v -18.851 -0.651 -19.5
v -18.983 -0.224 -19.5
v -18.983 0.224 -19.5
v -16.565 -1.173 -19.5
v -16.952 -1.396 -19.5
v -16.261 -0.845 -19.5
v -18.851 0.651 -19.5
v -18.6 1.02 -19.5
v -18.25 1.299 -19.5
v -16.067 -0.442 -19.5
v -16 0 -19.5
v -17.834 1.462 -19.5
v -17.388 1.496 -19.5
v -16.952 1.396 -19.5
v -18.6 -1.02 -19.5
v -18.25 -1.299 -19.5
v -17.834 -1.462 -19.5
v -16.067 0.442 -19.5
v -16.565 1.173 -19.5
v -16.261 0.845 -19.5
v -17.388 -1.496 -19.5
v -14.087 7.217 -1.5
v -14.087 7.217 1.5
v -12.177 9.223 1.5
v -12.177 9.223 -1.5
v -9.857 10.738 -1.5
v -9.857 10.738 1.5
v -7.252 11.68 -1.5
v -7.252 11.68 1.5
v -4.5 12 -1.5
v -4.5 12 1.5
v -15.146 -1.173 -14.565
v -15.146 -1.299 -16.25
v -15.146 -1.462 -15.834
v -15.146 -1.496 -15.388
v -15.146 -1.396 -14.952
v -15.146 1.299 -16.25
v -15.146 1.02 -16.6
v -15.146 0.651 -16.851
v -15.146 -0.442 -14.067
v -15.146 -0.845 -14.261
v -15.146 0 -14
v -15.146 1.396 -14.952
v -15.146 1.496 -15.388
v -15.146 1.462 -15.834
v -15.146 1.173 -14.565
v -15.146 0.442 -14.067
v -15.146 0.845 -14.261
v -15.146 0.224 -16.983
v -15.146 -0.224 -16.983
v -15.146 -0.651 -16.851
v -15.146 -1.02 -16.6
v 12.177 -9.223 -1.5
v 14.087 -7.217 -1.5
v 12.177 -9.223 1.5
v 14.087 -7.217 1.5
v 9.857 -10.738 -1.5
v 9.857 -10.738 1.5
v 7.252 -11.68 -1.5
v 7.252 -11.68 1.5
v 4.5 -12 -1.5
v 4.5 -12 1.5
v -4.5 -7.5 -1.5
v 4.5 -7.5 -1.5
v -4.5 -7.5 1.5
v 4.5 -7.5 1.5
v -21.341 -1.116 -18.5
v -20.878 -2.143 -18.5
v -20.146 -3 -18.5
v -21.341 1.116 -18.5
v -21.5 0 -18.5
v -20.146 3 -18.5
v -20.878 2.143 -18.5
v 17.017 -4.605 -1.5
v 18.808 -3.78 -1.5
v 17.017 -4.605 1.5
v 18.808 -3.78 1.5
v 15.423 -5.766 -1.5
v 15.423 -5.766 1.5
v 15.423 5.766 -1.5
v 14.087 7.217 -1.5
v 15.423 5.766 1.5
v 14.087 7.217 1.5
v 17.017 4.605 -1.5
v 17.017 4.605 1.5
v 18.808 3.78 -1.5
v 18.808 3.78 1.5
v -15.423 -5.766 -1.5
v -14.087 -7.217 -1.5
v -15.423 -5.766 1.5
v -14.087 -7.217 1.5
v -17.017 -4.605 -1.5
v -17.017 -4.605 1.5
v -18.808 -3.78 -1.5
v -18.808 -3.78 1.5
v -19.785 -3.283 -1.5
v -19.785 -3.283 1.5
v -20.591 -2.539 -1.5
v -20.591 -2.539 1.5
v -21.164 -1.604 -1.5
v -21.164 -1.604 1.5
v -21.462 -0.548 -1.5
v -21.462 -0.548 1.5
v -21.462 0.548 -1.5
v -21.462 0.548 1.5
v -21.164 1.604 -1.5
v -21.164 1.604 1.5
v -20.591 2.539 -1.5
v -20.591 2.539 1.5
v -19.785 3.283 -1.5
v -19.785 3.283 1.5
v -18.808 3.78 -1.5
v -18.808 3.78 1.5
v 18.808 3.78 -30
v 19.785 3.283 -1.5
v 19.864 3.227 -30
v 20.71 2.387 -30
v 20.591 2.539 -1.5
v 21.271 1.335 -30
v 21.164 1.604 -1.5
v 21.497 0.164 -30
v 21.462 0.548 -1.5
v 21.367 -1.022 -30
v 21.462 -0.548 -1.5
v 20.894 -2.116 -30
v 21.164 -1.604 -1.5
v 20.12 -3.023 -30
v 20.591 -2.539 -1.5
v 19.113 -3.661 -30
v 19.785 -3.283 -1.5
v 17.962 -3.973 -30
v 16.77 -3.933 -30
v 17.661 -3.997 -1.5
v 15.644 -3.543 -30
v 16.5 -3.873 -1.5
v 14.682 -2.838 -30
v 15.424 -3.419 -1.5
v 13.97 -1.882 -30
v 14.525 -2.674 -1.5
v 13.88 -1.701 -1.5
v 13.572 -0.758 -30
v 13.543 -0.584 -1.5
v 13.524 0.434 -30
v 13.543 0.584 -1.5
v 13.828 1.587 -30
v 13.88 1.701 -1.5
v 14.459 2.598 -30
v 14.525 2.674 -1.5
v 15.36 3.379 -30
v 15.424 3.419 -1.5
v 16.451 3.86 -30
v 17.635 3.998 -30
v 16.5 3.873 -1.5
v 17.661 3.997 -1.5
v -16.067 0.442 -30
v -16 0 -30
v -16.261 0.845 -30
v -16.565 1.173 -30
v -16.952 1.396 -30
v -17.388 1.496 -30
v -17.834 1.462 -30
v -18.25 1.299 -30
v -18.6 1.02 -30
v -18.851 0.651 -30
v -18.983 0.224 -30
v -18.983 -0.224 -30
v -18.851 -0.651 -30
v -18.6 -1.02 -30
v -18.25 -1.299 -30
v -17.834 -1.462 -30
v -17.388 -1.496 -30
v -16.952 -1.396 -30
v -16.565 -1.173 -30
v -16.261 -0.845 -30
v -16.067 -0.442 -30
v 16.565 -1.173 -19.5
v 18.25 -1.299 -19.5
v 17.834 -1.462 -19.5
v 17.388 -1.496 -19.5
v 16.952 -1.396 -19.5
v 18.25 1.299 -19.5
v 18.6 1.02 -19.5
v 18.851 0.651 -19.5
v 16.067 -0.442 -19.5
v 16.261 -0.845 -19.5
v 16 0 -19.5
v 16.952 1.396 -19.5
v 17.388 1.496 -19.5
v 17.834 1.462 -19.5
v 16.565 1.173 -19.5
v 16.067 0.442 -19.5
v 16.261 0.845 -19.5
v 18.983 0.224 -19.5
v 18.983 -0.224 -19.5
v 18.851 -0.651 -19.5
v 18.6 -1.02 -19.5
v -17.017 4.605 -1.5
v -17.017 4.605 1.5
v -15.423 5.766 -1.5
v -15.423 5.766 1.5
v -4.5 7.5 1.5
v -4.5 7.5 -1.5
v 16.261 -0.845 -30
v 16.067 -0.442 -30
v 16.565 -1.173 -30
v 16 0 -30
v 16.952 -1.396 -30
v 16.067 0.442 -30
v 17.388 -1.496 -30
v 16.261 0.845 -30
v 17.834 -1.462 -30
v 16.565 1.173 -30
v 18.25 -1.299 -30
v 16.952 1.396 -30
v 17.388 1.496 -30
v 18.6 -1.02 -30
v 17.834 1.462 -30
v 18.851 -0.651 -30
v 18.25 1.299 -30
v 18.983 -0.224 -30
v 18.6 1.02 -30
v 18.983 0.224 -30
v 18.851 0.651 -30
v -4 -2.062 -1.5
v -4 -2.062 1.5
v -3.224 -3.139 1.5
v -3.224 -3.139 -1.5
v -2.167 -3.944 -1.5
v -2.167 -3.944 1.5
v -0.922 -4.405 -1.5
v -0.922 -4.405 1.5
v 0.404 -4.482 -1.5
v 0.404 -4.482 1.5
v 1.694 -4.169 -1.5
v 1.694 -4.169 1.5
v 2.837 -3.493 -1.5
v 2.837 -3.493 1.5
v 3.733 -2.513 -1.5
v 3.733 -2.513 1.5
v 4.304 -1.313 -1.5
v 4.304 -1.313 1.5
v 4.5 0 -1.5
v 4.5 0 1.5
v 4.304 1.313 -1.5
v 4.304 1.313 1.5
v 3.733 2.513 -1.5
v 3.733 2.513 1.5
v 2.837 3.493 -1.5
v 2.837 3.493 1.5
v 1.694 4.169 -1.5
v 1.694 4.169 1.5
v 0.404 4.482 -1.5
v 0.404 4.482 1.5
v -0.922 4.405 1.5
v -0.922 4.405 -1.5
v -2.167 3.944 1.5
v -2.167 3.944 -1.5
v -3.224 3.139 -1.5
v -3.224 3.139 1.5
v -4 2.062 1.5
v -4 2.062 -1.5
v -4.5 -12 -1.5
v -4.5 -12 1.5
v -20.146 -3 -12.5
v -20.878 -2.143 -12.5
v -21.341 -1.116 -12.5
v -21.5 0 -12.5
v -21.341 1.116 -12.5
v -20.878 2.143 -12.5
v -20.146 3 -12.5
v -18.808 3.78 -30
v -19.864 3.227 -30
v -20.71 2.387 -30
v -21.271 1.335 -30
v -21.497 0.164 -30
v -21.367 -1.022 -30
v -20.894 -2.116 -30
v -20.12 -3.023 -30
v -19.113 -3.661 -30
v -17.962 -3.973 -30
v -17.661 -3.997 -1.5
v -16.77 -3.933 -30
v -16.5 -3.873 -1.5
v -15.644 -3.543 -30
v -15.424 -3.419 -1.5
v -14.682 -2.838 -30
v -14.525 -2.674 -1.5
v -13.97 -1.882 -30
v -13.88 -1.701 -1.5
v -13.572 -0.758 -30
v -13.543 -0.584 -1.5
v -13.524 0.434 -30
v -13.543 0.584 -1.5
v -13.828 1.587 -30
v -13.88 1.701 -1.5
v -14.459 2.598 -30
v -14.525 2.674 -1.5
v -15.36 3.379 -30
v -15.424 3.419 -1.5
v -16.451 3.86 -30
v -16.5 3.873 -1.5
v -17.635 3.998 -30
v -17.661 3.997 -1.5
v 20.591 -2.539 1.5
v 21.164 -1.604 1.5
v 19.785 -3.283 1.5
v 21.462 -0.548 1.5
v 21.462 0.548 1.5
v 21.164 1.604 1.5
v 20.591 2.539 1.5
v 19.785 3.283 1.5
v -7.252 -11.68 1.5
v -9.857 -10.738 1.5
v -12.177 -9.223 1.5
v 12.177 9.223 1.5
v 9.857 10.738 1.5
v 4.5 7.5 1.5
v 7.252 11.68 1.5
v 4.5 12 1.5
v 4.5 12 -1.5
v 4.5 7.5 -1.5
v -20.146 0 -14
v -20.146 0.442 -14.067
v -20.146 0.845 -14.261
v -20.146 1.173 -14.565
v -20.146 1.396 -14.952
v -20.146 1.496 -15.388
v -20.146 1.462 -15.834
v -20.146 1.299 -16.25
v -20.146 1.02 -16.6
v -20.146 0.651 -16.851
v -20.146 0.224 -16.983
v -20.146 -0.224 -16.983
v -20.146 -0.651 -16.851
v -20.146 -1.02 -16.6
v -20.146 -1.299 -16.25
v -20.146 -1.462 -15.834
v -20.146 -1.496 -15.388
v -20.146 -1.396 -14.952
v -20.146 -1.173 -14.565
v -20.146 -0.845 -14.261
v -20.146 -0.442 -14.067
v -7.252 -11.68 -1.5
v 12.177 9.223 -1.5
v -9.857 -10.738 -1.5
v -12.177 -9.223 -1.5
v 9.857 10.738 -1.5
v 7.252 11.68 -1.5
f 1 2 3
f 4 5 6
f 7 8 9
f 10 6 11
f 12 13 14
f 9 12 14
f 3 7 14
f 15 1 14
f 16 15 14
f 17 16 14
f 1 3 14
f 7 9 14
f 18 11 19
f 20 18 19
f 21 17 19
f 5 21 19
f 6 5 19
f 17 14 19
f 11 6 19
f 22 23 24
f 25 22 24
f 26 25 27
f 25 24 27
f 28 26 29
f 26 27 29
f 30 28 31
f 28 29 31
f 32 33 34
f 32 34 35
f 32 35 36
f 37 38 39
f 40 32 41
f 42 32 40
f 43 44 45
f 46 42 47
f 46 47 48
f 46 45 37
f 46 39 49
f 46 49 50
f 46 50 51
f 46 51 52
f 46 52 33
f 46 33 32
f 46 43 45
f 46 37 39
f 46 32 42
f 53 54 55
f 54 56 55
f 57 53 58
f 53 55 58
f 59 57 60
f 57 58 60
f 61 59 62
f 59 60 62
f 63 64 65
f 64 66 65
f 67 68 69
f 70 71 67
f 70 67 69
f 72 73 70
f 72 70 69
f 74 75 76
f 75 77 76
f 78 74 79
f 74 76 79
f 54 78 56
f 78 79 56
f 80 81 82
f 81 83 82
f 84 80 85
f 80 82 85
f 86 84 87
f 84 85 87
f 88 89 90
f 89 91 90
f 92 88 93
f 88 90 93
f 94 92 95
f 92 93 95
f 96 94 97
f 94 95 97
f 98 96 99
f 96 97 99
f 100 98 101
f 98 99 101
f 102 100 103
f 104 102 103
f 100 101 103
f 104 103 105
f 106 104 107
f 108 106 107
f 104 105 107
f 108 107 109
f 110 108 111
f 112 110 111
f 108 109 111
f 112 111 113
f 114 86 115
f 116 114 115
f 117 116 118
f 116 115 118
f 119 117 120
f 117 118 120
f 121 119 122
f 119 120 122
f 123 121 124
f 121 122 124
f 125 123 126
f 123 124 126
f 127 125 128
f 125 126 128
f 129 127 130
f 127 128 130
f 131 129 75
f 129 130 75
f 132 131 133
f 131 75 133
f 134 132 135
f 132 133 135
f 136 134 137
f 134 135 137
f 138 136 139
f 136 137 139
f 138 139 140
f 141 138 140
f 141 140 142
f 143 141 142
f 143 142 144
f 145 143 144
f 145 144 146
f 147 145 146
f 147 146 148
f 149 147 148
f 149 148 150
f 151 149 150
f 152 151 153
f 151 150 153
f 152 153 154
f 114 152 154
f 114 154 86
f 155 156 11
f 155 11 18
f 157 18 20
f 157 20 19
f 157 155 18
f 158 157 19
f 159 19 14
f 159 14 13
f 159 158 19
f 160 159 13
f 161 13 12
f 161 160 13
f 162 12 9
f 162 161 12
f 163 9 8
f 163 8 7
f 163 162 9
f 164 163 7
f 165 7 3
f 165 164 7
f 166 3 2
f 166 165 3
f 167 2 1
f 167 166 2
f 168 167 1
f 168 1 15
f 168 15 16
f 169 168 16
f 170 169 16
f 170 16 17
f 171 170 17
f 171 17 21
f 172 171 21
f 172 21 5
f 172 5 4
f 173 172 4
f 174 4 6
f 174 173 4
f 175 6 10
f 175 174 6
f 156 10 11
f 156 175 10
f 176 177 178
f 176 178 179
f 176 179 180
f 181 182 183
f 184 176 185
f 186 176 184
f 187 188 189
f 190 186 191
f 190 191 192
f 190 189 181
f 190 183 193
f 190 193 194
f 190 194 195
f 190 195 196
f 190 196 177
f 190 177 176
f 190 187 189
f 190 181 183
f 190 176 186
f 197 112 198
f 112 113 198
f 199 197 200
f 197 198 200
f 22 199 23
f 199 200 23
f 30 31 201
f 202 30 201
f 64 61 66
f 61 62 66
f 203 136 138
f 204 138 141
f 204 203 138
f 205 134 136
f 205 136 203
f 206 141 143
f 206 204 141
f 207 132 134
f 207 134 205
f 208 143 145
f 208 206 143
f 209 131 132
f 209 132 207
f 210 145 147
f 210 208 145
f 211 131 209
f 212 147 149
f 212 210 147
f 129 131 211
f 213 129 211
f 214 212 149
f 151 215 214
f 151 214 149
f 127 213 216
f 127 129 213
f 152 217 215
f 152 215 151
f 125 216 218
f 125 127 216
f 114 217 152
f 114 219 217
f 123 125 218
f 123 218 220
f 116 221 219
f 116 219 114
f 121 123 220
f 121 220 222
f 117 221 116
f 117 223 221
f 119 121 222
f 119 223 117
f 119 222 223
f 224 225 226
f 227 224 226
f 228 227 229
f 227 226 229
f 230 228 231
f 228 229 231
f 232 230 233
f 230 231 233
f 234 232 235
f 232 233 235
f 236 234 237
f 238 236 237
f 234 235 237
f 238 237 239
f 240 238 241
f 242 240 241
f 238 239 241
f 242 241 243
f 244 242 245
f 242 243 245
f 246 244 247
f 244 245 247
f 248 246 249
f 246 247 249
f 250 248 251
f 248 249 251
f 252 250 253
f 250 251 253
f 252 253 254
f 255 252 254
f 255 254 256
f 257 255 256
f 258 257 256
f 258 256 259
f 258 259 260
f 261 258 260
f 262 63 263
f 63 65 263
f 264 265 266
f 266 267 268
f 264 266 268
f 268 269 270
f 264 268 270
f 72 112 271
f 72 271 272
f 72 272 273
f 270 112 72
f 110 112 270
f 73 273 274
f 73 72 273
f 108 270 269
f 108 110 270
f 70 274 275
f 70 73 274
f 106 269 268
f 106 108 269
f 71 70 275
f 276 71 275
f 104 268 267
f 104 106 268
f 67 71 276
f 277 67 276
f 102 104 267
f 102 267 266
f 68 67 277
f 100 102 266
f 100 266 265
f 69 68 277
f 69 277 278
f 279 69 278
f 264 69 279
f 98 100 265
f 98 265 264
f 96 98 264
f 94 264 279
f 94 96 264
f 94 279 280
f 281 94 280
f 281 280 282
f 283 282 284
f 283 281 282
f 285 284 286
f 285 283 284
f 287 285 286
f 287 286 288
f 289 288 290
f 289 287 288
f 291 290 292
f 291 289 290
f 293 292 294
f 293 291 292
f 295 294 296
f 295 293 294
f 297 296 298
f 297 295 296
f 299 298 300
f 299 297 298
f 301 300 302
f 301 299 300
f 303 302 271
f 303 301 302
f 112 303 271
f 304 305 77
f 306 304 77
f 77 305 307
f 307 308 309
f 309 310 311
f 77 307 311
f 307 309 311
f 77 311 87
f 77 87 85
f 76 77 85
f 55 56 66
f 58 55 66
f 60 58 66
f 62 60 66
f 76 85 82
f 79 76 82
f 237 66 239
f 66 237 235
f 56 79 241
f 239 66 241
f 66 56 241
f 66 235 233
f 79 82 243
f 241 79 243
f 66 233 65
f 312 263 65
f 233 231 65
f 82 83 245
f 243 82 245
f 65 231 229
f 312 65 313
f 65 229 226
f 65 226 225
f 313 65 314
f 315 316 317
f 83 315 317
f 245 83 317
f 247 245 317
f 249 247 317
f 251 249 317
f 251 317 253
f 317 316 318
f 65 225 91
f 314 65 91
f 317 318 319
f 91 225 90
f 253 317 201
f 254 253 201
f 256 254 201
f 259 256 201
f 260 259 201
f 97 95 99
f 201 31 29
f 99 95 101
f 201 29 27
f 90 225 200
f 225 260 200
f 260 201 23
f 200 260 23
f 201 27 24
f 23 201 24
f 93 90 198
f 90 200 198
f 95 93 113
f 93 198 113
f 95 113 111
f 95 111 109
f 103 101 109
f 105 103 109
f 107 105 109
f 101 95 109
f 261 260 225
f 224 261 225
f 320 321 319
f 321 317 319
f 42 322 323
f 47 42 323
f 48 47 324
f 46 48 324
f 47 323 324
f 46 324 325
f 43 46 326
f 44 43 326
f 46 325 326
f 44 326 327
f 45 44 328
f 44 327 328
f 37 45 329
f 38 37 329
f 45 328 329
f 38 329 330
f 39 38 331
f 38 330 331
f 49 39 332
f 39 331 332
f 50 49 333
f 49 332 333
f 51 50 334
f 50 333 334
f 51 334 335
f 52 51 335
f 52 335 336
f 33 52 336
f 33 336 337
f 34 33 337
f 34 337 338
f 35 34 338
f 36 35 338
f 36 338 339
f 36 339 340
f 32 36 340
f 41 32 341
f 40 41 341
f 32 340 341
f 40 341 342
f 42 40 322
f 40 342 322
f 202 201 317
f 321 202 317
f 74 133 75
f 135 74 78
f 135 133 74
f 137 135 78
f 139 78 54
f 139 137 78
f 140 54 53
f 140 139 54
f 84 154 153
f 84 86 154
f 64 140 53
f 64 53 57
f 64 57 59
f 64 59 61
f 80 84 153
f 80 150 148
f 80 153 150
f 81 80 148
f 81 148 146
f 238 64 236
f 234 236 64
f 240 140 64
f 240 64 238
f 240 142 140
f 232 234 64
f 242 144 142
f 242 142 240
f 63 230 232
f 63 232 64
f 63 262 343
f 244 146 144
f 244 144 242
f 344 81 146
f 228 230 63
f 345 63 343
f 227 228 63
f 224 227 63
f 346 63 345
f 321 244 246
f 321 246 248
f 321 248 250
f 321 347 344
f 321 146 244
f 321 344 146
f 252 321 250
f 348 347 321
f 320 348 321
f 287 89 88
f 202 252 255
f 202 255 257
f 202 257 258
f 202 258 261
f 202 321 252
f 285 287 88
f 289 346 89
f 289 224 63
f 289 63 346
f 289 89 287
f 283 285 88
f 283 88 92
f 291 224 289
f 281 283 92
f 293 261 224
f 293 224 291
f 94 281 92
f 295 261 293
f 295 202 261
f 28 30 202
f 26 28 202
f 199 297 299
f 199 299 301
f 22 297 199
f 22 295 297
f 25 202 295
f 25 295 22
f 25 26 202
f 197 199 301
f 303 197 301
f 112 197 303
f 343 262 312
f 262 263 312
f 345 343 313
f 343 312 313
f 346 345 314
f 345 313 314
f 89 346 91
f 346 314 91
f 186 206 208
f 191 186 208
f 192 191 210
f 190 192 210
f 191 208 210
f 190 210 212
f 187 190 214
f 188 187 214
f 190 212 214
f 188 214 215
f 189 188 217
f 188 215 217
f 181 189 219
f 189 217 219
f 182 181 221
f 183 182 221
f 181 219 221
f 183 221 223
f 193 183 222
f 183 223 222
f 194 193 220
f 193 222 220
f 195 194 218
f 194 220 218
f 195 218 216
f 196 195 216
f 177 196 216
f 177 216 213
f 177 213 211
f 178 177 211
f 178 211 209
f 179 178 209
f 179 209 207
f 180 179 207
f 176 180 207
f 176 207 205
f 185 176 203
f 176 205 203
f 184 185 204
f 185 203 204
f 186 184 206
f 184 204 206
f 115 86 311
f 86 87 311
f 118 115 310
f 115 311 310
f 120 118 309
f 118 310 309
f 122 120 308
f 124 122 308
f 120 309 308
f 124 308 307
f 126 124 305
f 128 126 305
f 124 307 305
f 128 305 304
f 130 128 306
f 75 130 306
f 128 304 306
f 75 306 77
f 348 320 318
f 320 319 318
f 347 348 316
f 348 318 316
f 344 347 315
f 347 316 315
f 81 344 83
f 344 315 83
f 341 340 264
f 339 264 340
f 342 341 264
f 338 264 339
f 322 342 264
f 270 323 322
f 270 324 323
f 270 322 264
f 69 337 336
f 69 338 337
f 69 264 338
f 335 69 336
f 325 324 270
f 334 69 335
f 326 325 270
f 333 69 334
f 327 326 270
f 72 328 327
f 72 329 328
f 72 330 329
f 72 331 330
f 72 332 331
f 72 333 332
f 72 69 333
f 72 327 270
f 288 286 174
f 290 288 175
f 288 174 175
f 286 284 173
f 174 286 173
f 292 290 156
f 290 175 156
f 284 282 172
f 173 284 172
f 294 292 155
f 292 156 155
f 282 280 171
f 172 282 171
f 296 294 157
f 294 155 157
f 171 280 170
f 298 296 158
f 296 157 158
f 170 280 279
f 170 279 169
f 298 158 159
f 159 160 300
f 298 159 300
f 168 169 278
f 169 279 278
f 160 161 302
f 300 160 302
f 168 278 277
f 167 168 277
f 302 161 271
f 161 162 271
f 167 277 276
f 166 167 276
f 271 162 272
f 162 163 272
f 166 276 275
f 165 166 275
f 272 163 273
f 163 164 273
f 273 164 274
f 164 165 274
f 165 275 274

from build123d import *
from build123d.topology import SkipClean

# Parameters (mm, degrees)
EXTRUDE_1_DEPTH     = 1.5
CUT_EXTRUDE_1_DEPTH = 25.80423351
SKETCH_5_R          = 4
EXTRUDE_2_DEPTH     = 28.5
SKETCH_8_R          = 1.5
CUT_EXTRUDE_2_DEPTH = 10.5
CUT_EXTRUDE_3_DEPTH = 3
SKETCH_11_R         = 1.5
CUT_EXTRUDE_4_DEPTH = 5


with BuildPart() as part:
    # 草图1 → 凸台-拉伸1 (new, symmetric)
    with BuildSketch(Plane.XY):
        with BuildLine():
            Line((-4.5, 7.5), (4.5, 7.5))
            Line((4.5, 7.5), (4.5, 12))
            ThreePointArc((4.5, 12), (9.857189903, 10.7378078), (14.087412587, 7.216752724))
            ThreePointArc((14.087412587, 7.216752724), (16.191153731, 5.146301215), (18.807692308, 3.780203808))
            ThreePointArc((18.807692308, 3.780203808), (21.5, 0), (18.807692308, -3.780203808))
            ThreePointArc((18.807692308, -3.780203808), (16.191153731, -5.146301215), (14.087412587, -7.216752724))
            ThreePointArc((14.087412587, -7.216752724), (9.857189903, -10.7378078), (4.5, -12))
            Line((4.5, -12), (4.5, -7.5))
            Line((4.5, -7.5), (-4.5, -7.5))
            Line((-4.5, -7.5), (-4.5, -12))
            ThreePointArc((-4.5, -12), (-9.857189903, -10.7378078), (-14.087412587, -7.216752724))
            ThreePointArc((-14.087412587, -7.216752724), (-16.191153731, -5.146301215), (-18.807692308, -3.780203808))
            ThreePointArc((-18.807692308, -3.780203808), (-21.5, 0), (-18.807692308, 3.780203808))
            ThreePointArc((-18.807692308, 3.780203808), (-16.191153731, 5.146301215), (-14.087412587, 7.216752724))
            ThreePointArc((-14.087412587, 7.216752724), (-9.857189903, 10.7378078), (-4.5, 12))
            Line((-4.5, 12), (-4.5, 7.5))
        make_face()
    extrude(amount=EXTRUDE_1_DEPTH, both=True)

    # 草图4 → 切除-拉伸1 (cut, through all)
    with BuildSketch(Plane.XY.offset(1.5)):
        with BuildLine():
            Line((-4, 2.061552813), (-4, -2.061552813))
            ThreePointArc((-4, -2.061552813), (4.5, 0), (-4, 2.061552813))
        make_face()
    extrude(amount=-CUT_EXTRUDE_1_DEPTH, mode=Mode.SUBTRACT)

    # 草图5 → 凸台-拉伸2 (add)
    with BuildSketch(Plane(origin=(0, 0, -1.5), x_dir=(-1, 0, 0), z_dir=(0, 0, -1))):
        with Locations(Location((-17.5, 0, 0), (0, 0, 109.082124804))):
            Circle(SKETCH_5_R)
    extrude_2 = extrude(amount=EXTRUDE_2_DEPTH)

    # 草图8 → 切除-拉伸2 (cut)
    with BuildSketch(Plane(origin=(0, 0, -30), x_dir=(-1, 0, 0), z_dir=(0, 0, -1))):
        with Locations((-17.5, 0)):
            Circle(SKETCH_8_R)
    cut_extrude_2 = extrude(amount=-CUT_EXTRUDE_2_DEPTH, mode=Mode.SUBTRACT)

    # 镜向2: 凸台-拉伸2, 切除-拉伸2 across plane
    with SkipClean():  # the faces are left unmerged after this step: merging them gives an invalid solid
        add(extrude_2.mirror(Plane(origin=(0, 0, 0), x_dir=(0, 0, 1), z_dir=(1, 0, 0))))
        add(cut_extrude_2.mirror(Plane(origin=(0, 0, 0), x_dir=(0, 0, 1), z_dir=(1, 0, 0))), mode=Mode.SUBTRACT)

    # 草图10 → 切除-拉伸3 (cut, symmetric)
    with SkipClean():  # the faces are left unmerged after this step: merging them gives an invalid solid
        with BuildSketch(Plane(origin=(0, 0, -15.5), x_dir=(-1, 0, 0), z_dir=(0, 0, -1))):
            with BuildLine():
                Line((20.145751311, -3), (20.145751311, 3))
                ThreePointArc((20.145751311, 3), (21.5, 0), (20.145751311, -3))
            make_face()
        extrude(amount=CUT_EXTRUDE_3_DEPTH, both=True, mode=Mode.SUBTRACT)

    # 草图11 → 切除-拉伸4 (cut)
    with SkipClean():  # the faces are left unmerged after this step: merging them gives an invalid solid
        with BuildSketch(Plane.ZY.offset(20.145751311)):
            with Locations((-15.5, 0)):
                Circle(SKETCH_11_R)
        extrude(amount=-CUT_EXTRUDE_4_DEPTH, mode=Mode.SUBTRACT)


solid = part.part
